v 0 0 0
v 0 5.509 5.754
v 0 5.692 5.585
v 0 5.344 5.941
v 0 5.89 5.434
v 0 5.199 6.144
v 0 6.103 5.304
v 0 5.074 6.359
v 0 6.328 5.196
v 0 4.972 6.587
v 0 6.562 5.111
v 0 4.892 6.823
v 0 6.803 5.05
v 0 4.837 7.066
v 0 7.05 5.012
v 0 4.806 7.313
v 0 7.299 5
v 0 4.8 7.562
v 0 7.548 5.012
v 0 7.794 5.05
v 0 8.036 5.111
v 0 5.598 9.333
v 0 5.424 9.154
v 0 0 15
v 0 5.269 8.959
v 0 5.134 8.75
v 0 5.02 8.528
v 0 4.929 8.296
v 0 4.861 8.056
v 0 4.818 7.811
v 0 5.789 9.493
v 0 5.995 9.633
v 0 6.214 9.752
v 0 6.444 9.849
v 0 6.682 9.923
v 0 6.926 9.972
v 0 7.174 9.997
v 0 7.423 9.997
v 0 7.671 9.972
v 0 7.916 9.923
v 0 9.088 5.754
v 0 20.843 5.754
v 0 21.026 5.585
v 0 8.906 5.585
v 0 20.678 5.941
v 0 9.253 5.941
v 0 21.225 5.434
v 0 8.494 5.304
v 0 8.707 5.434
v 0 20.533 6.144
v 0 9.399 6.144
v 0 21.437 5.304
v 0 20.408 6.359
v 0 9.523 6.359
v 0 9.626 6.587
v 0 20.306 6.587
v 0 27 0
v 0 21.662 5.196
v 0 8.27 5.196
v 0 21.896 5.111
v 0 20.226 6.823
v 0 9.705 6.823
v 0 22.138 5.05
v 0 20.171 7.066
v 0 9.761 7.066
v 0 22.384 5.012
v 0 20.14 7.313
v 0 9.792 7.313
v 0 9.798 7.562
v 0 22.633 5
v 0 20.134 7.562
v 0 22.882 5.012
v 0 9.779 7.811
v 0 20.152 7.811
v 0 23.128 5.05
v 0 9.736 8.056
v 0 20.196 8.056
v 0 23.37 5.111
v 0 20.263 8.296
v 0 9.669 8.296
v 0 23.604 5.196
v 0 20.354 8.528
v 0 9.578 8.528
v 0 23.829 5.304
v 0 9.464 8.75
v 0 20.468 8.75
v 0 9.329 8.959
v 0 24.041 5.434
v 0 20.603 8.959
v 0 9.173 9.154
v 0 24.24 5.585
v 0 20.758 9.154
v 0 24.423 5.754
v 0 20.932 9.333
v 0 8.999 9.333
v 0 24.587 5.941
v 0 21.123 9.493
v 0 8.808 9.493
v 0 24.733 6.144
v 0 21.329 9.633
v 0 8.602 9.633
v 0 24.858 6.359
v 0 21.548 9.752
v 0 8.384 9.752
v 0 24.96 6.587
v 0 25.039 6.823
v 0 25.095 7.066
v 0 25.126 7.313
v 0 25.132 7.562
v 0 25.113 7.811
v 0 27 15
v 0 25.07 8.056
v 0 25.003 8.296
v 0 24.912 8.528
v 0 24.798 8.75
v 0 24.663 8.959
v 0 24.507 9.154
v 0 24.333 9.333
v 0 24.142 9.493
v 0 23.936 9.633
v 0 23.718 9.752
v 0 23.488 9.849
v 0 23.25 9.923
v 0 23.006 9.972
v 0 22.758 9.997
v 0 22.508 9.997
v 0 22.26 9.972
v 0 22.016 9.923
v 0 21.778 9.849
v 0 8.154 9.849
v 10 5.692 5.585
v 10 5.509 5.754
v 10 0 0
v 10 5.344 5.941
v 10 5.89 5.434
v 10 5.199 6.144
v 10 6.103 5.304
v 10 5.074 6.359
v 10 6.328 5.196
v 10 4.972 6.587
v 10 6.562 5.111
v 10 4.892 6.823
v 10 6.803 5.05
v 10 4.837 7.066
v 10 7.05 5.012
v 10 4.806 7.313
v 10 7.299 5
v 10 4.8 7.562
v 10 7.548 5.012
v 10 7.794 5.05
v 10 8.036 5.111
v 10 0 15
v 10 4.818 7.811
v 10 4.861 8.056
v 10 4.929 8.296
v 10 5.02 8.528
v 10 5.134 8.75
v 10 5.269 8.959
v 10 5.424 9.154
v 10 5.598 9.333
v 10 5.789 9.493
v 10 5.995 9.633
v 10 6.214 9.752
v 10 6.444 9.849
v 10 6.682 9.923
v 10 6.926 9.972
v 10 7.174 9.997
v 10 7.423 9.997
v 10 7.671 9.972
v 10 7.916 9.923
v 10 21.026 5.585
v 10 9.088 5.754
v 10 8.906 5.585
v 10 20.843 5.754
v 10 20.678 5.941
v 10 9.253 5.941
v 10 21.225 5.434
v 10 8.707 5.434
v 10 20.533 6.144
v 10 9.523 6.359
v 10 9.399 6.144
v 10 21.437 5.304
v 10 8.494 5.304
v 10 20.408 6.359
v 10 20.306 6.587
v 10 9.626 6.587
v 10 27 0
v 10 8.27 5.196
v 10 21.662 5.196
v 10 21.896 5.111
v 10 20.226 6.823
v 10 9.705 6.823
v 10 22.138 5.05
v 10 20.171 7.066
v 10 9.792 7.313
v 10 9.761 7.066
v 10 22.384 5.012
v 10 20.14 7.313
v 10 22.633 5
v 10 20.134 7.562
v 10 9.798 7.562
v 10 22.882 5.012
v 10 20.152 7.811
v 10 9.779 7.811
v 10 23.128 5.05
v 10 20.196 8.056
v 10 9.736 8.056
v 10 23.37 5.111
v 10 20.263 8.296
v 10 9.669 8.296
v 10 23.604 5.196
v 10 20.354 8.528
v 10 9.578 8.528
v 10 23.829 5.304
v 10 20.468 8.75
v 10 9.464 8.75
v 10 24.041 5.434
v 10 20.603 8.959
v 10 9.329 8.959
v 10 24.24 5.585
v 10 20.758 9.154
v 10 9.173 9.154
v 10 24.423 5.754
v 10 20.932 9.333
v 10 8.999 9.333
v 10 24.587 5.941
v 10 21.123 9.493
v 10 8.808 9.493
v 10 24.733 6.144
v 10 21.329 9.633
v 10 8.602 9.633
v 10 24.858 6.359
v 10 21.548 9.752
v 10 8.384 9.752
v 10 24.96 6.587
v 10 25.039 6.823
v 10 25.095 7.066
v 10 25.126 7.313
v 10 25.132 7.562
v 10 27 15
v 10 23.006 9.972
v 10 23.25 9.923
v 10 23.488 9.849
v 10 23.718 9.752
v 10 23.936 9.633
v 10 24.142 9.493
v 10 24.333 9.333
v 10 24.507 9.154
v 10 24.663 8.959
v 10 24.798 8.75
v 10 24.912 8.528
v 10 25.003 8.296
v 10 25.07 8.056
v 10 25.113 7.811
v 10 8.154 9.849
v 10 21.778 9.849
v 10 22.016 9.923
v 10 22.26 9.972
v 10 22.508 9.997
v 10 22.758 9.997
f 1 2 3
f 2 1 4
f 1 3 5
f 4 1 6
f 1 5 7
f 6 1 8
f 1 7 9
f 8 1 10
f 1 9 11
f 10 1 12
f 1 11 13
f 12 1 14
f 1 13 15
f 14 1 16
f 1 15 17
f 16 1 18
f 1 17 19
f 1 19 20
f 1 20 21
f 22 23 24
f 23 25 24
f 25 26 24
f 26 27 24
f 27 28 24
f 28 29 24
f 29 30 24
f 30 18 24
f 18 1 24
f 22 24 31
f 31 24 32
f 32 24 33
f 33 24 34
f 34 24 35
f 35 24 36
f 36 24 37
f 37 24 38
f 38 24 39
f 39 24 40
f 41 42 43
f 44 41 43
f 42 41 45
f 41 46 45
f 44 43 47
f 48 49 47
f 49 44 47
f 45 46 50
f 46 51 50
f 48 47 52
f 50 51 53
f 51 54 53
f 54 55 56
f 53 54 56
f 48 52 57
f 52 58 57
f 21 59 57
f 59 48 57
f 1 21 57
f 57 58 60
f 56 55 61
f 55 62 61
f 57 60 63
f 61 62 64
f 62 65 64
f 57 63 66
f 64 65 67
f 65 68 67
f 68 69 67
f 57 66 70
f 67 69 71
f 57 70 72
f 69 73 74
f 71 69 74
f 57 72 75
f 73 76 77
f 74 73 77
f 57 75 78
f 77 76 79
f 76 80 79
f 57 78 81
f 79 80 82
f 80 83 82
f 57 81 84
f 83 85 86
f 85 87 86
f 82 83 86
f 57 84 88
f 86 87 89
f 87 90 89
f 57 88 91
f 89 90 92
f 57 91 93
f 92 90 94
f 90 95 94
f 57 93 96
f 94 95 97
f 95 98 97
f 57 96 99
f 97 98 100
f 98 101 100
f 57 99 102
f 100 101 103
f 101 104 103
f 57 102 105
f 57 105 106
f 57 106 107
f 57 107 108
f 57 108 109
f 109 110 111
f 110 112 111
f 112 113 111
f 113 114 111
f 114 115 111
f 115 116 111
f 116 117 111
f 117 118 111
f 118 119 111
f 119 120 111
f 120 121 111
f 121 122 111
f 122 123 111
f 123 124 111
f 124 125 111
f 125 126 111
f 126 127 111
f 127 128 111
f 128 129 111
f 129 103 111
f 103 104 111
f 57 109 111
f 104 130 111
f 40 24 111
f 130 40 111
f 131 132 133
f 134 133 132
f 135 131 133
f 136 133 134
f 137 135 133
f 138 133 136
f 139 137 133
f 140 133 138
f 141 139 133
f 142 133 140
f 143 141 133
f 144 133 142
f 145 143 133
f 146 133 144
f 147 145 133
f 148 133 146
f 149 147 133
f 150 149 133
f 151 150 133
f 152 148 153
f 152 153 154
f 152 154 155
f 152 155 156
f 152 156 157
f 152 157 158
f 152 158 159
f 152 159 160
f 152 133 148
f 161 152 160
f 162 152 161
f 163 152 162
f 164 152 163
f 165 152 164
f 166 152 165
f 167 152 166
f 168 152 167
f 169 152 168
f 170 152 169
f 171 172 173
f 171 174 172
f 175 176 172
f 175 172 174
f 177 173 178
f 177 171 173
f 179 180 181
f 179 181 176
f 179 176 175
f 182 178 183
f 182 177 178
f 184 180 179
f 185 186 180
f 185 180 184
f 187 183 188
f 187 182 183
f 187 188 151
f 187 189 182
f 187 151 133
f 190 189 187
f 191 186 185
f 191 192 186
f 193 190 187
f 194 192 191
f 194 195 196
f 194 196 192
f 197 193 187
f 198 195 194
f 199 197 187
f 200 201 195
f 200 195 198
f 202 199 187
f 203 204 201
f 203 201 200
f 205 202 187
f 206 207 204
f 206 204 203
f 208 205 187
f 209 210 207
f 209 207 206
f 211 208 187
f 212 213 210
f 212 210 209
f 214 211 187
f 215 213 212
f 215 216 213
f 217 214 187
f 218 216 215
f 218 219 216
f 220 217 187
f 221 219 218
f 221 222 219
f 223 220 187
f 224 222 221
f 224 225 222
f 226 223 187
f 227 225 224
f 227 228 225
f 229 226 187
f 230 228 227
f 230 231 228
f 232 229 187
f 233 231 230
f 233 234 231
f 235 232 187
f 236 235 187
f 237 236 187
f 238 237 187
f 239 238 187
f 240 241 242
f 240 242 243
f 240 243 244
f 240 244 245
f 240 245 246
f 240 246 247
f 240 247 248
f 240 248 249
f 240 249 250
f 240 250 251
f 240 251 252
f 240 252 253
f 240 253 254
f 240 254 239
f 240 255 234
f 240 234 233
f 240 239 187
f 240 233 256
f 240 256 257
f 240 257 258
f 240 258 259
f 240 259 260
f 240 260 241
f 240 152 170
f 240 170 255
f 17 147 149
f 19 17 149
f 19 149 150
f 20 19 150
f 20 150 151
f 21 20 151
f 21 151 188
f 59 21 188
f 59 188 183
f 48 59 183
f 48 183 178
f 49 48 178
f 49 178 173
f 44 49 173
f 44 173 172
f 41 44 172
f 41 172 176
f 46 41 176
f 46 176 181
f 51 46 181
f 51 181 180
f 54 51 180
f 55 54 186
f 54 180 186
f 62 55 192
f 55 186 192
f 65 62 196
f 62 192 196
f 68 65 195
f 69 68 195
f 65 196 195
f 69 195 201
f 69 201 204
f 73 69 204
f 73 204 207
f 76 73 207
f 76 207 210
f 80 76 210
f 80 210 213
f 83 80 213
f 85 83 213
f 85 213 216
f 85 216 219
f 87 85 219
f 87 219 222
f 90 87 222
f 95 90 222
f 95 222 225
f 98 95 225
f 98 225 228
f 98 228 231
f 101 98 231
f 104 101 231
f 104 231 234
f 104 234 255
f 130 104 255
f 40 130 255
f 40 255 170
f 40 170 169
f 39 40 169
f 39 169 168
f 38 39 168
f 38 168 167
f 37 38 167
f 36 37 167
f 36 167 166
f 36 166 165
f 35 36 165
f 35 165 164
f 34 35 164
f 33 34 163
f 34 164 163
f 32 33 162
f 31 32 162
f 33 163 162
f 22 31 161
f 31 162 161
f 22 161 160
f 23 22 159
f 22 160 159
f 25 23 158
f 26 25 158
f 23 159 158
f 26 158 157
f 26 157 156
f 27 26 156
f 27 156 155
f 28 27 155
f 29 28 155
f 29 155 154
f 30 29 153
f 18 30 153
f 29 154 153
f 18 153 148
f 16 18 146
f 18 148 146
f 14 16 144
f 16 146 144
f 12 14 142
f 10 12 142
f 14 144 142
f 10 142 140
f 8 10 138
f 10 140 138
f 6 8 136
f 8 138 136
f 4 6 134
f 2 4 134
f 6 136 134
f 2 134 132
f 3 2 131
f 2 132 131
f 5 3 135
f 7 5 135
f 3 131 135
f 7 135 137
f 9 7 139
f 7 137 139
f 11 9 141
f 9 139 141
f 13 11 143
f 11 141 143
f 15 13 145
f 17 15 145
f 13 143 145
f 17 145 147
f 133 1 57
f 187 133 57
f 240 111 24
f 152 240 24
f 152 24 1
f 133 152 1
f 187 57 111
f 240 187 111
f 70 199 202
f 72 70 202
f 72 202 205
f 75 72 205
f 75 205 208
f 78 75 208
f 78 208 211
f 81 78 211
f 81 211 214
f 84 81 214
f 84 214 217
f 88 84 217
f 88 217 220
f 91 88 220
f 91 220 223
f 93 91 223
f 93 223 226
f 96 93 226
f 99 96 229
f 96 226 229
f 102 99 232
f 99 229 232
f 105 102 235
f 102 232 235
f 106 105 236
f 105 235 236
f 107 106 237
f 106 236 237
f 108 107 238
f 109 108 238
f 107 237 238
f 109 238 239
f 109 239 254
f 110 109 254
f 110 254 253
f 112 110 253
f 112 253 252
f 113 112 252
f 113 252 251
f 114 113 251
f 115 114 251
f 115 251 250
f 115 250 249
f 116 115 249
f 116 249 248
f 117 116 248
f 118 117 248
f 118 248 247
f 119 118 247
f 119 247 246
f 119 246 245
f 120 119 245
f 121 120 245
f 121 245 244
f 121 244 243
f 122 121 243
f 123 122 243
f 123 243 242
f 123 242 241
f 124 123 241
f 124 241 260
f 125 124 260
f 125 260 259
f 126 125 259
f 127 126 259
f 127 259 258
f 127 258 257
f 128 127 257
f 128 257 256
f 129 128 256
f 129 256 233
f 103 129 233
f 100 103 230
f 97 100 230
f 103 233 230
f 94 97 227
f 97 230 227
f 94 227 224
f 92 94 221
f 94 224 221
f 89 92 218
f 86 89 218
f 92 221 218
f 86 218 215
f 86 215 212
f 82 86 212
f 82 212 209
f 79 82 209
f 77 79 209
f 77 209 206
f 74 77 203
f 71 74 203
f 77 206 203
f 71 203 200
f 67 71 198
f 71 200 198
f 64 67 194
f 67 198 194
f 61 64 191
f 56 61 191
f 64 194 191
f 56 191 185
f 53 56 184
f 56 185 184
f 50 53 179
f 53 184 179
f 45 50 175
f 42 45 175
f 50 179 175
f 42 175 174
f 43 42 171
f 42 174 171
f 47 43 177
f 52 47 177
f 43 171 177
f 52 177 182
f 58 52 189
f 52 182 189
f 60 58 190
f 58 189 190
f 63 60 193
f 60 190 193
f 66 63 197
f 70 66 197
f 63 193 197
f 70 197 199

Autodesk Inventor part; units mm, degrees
ref_plane "YZ Plane" through (0, 0, 0) normal (1, 0, 0) x (0, 1, 0)
ref_plane "XZ Plane" through (0, 0, 0) normal (0, 1, 0) x (-1, 0, 0)
ref_plane "XY Plane" through (0, 0, 0) normal (0, 0, 1) x (1, 0, 0)
sketch "Sketch1" plane through (0, 0, 0) normal (1, 0, 0) x (0, 1, 0)
  line L0 (0, 0) -> (27, 0)
  line L1 (27, 0) -> (27, 15)
  line L2 (27, 15) -> (0, 15)
  line L3 (0, 15) -> (0, 0)
  dimension "d0" = 27
  dimension "d1" = 15
extrude "Extrusion1" add sketch "Sketch1" along normal blind 10
sketch "Sketch2" plane through (10, 0, 0) normal (1, 0, 0) x (0, 0, -1)
  line L0 (0, 27) -> (-15, 27) projected
  line L1 (-7.5, 27) -> (-7.5, 0)
  line L2 (-15, 0) -> (0, 0) projected
  line L3 (-10.4795, 25.2) -> (-4.5199, 25.2)
  circle A0 centre (-7.5, 22.6329) radius 2.5
  line L4 (-10.4795, 10) -> (-5, 10)
  circle A1 centre (-7.5, 7.2988) radius 2.5
  dimension "d4" = 1.8
  dimension "d5" = 5
  dimension "d6" = 17
  dimension "d7" = 5
extrude "Extrusion2" cut sketch "Sketch2" against normal blind 10
sketch "Sketch3" plane through (10, 0, 0) normal (1, 0, 0) x (0, 0, -1)
  point P0 (0, 0)
